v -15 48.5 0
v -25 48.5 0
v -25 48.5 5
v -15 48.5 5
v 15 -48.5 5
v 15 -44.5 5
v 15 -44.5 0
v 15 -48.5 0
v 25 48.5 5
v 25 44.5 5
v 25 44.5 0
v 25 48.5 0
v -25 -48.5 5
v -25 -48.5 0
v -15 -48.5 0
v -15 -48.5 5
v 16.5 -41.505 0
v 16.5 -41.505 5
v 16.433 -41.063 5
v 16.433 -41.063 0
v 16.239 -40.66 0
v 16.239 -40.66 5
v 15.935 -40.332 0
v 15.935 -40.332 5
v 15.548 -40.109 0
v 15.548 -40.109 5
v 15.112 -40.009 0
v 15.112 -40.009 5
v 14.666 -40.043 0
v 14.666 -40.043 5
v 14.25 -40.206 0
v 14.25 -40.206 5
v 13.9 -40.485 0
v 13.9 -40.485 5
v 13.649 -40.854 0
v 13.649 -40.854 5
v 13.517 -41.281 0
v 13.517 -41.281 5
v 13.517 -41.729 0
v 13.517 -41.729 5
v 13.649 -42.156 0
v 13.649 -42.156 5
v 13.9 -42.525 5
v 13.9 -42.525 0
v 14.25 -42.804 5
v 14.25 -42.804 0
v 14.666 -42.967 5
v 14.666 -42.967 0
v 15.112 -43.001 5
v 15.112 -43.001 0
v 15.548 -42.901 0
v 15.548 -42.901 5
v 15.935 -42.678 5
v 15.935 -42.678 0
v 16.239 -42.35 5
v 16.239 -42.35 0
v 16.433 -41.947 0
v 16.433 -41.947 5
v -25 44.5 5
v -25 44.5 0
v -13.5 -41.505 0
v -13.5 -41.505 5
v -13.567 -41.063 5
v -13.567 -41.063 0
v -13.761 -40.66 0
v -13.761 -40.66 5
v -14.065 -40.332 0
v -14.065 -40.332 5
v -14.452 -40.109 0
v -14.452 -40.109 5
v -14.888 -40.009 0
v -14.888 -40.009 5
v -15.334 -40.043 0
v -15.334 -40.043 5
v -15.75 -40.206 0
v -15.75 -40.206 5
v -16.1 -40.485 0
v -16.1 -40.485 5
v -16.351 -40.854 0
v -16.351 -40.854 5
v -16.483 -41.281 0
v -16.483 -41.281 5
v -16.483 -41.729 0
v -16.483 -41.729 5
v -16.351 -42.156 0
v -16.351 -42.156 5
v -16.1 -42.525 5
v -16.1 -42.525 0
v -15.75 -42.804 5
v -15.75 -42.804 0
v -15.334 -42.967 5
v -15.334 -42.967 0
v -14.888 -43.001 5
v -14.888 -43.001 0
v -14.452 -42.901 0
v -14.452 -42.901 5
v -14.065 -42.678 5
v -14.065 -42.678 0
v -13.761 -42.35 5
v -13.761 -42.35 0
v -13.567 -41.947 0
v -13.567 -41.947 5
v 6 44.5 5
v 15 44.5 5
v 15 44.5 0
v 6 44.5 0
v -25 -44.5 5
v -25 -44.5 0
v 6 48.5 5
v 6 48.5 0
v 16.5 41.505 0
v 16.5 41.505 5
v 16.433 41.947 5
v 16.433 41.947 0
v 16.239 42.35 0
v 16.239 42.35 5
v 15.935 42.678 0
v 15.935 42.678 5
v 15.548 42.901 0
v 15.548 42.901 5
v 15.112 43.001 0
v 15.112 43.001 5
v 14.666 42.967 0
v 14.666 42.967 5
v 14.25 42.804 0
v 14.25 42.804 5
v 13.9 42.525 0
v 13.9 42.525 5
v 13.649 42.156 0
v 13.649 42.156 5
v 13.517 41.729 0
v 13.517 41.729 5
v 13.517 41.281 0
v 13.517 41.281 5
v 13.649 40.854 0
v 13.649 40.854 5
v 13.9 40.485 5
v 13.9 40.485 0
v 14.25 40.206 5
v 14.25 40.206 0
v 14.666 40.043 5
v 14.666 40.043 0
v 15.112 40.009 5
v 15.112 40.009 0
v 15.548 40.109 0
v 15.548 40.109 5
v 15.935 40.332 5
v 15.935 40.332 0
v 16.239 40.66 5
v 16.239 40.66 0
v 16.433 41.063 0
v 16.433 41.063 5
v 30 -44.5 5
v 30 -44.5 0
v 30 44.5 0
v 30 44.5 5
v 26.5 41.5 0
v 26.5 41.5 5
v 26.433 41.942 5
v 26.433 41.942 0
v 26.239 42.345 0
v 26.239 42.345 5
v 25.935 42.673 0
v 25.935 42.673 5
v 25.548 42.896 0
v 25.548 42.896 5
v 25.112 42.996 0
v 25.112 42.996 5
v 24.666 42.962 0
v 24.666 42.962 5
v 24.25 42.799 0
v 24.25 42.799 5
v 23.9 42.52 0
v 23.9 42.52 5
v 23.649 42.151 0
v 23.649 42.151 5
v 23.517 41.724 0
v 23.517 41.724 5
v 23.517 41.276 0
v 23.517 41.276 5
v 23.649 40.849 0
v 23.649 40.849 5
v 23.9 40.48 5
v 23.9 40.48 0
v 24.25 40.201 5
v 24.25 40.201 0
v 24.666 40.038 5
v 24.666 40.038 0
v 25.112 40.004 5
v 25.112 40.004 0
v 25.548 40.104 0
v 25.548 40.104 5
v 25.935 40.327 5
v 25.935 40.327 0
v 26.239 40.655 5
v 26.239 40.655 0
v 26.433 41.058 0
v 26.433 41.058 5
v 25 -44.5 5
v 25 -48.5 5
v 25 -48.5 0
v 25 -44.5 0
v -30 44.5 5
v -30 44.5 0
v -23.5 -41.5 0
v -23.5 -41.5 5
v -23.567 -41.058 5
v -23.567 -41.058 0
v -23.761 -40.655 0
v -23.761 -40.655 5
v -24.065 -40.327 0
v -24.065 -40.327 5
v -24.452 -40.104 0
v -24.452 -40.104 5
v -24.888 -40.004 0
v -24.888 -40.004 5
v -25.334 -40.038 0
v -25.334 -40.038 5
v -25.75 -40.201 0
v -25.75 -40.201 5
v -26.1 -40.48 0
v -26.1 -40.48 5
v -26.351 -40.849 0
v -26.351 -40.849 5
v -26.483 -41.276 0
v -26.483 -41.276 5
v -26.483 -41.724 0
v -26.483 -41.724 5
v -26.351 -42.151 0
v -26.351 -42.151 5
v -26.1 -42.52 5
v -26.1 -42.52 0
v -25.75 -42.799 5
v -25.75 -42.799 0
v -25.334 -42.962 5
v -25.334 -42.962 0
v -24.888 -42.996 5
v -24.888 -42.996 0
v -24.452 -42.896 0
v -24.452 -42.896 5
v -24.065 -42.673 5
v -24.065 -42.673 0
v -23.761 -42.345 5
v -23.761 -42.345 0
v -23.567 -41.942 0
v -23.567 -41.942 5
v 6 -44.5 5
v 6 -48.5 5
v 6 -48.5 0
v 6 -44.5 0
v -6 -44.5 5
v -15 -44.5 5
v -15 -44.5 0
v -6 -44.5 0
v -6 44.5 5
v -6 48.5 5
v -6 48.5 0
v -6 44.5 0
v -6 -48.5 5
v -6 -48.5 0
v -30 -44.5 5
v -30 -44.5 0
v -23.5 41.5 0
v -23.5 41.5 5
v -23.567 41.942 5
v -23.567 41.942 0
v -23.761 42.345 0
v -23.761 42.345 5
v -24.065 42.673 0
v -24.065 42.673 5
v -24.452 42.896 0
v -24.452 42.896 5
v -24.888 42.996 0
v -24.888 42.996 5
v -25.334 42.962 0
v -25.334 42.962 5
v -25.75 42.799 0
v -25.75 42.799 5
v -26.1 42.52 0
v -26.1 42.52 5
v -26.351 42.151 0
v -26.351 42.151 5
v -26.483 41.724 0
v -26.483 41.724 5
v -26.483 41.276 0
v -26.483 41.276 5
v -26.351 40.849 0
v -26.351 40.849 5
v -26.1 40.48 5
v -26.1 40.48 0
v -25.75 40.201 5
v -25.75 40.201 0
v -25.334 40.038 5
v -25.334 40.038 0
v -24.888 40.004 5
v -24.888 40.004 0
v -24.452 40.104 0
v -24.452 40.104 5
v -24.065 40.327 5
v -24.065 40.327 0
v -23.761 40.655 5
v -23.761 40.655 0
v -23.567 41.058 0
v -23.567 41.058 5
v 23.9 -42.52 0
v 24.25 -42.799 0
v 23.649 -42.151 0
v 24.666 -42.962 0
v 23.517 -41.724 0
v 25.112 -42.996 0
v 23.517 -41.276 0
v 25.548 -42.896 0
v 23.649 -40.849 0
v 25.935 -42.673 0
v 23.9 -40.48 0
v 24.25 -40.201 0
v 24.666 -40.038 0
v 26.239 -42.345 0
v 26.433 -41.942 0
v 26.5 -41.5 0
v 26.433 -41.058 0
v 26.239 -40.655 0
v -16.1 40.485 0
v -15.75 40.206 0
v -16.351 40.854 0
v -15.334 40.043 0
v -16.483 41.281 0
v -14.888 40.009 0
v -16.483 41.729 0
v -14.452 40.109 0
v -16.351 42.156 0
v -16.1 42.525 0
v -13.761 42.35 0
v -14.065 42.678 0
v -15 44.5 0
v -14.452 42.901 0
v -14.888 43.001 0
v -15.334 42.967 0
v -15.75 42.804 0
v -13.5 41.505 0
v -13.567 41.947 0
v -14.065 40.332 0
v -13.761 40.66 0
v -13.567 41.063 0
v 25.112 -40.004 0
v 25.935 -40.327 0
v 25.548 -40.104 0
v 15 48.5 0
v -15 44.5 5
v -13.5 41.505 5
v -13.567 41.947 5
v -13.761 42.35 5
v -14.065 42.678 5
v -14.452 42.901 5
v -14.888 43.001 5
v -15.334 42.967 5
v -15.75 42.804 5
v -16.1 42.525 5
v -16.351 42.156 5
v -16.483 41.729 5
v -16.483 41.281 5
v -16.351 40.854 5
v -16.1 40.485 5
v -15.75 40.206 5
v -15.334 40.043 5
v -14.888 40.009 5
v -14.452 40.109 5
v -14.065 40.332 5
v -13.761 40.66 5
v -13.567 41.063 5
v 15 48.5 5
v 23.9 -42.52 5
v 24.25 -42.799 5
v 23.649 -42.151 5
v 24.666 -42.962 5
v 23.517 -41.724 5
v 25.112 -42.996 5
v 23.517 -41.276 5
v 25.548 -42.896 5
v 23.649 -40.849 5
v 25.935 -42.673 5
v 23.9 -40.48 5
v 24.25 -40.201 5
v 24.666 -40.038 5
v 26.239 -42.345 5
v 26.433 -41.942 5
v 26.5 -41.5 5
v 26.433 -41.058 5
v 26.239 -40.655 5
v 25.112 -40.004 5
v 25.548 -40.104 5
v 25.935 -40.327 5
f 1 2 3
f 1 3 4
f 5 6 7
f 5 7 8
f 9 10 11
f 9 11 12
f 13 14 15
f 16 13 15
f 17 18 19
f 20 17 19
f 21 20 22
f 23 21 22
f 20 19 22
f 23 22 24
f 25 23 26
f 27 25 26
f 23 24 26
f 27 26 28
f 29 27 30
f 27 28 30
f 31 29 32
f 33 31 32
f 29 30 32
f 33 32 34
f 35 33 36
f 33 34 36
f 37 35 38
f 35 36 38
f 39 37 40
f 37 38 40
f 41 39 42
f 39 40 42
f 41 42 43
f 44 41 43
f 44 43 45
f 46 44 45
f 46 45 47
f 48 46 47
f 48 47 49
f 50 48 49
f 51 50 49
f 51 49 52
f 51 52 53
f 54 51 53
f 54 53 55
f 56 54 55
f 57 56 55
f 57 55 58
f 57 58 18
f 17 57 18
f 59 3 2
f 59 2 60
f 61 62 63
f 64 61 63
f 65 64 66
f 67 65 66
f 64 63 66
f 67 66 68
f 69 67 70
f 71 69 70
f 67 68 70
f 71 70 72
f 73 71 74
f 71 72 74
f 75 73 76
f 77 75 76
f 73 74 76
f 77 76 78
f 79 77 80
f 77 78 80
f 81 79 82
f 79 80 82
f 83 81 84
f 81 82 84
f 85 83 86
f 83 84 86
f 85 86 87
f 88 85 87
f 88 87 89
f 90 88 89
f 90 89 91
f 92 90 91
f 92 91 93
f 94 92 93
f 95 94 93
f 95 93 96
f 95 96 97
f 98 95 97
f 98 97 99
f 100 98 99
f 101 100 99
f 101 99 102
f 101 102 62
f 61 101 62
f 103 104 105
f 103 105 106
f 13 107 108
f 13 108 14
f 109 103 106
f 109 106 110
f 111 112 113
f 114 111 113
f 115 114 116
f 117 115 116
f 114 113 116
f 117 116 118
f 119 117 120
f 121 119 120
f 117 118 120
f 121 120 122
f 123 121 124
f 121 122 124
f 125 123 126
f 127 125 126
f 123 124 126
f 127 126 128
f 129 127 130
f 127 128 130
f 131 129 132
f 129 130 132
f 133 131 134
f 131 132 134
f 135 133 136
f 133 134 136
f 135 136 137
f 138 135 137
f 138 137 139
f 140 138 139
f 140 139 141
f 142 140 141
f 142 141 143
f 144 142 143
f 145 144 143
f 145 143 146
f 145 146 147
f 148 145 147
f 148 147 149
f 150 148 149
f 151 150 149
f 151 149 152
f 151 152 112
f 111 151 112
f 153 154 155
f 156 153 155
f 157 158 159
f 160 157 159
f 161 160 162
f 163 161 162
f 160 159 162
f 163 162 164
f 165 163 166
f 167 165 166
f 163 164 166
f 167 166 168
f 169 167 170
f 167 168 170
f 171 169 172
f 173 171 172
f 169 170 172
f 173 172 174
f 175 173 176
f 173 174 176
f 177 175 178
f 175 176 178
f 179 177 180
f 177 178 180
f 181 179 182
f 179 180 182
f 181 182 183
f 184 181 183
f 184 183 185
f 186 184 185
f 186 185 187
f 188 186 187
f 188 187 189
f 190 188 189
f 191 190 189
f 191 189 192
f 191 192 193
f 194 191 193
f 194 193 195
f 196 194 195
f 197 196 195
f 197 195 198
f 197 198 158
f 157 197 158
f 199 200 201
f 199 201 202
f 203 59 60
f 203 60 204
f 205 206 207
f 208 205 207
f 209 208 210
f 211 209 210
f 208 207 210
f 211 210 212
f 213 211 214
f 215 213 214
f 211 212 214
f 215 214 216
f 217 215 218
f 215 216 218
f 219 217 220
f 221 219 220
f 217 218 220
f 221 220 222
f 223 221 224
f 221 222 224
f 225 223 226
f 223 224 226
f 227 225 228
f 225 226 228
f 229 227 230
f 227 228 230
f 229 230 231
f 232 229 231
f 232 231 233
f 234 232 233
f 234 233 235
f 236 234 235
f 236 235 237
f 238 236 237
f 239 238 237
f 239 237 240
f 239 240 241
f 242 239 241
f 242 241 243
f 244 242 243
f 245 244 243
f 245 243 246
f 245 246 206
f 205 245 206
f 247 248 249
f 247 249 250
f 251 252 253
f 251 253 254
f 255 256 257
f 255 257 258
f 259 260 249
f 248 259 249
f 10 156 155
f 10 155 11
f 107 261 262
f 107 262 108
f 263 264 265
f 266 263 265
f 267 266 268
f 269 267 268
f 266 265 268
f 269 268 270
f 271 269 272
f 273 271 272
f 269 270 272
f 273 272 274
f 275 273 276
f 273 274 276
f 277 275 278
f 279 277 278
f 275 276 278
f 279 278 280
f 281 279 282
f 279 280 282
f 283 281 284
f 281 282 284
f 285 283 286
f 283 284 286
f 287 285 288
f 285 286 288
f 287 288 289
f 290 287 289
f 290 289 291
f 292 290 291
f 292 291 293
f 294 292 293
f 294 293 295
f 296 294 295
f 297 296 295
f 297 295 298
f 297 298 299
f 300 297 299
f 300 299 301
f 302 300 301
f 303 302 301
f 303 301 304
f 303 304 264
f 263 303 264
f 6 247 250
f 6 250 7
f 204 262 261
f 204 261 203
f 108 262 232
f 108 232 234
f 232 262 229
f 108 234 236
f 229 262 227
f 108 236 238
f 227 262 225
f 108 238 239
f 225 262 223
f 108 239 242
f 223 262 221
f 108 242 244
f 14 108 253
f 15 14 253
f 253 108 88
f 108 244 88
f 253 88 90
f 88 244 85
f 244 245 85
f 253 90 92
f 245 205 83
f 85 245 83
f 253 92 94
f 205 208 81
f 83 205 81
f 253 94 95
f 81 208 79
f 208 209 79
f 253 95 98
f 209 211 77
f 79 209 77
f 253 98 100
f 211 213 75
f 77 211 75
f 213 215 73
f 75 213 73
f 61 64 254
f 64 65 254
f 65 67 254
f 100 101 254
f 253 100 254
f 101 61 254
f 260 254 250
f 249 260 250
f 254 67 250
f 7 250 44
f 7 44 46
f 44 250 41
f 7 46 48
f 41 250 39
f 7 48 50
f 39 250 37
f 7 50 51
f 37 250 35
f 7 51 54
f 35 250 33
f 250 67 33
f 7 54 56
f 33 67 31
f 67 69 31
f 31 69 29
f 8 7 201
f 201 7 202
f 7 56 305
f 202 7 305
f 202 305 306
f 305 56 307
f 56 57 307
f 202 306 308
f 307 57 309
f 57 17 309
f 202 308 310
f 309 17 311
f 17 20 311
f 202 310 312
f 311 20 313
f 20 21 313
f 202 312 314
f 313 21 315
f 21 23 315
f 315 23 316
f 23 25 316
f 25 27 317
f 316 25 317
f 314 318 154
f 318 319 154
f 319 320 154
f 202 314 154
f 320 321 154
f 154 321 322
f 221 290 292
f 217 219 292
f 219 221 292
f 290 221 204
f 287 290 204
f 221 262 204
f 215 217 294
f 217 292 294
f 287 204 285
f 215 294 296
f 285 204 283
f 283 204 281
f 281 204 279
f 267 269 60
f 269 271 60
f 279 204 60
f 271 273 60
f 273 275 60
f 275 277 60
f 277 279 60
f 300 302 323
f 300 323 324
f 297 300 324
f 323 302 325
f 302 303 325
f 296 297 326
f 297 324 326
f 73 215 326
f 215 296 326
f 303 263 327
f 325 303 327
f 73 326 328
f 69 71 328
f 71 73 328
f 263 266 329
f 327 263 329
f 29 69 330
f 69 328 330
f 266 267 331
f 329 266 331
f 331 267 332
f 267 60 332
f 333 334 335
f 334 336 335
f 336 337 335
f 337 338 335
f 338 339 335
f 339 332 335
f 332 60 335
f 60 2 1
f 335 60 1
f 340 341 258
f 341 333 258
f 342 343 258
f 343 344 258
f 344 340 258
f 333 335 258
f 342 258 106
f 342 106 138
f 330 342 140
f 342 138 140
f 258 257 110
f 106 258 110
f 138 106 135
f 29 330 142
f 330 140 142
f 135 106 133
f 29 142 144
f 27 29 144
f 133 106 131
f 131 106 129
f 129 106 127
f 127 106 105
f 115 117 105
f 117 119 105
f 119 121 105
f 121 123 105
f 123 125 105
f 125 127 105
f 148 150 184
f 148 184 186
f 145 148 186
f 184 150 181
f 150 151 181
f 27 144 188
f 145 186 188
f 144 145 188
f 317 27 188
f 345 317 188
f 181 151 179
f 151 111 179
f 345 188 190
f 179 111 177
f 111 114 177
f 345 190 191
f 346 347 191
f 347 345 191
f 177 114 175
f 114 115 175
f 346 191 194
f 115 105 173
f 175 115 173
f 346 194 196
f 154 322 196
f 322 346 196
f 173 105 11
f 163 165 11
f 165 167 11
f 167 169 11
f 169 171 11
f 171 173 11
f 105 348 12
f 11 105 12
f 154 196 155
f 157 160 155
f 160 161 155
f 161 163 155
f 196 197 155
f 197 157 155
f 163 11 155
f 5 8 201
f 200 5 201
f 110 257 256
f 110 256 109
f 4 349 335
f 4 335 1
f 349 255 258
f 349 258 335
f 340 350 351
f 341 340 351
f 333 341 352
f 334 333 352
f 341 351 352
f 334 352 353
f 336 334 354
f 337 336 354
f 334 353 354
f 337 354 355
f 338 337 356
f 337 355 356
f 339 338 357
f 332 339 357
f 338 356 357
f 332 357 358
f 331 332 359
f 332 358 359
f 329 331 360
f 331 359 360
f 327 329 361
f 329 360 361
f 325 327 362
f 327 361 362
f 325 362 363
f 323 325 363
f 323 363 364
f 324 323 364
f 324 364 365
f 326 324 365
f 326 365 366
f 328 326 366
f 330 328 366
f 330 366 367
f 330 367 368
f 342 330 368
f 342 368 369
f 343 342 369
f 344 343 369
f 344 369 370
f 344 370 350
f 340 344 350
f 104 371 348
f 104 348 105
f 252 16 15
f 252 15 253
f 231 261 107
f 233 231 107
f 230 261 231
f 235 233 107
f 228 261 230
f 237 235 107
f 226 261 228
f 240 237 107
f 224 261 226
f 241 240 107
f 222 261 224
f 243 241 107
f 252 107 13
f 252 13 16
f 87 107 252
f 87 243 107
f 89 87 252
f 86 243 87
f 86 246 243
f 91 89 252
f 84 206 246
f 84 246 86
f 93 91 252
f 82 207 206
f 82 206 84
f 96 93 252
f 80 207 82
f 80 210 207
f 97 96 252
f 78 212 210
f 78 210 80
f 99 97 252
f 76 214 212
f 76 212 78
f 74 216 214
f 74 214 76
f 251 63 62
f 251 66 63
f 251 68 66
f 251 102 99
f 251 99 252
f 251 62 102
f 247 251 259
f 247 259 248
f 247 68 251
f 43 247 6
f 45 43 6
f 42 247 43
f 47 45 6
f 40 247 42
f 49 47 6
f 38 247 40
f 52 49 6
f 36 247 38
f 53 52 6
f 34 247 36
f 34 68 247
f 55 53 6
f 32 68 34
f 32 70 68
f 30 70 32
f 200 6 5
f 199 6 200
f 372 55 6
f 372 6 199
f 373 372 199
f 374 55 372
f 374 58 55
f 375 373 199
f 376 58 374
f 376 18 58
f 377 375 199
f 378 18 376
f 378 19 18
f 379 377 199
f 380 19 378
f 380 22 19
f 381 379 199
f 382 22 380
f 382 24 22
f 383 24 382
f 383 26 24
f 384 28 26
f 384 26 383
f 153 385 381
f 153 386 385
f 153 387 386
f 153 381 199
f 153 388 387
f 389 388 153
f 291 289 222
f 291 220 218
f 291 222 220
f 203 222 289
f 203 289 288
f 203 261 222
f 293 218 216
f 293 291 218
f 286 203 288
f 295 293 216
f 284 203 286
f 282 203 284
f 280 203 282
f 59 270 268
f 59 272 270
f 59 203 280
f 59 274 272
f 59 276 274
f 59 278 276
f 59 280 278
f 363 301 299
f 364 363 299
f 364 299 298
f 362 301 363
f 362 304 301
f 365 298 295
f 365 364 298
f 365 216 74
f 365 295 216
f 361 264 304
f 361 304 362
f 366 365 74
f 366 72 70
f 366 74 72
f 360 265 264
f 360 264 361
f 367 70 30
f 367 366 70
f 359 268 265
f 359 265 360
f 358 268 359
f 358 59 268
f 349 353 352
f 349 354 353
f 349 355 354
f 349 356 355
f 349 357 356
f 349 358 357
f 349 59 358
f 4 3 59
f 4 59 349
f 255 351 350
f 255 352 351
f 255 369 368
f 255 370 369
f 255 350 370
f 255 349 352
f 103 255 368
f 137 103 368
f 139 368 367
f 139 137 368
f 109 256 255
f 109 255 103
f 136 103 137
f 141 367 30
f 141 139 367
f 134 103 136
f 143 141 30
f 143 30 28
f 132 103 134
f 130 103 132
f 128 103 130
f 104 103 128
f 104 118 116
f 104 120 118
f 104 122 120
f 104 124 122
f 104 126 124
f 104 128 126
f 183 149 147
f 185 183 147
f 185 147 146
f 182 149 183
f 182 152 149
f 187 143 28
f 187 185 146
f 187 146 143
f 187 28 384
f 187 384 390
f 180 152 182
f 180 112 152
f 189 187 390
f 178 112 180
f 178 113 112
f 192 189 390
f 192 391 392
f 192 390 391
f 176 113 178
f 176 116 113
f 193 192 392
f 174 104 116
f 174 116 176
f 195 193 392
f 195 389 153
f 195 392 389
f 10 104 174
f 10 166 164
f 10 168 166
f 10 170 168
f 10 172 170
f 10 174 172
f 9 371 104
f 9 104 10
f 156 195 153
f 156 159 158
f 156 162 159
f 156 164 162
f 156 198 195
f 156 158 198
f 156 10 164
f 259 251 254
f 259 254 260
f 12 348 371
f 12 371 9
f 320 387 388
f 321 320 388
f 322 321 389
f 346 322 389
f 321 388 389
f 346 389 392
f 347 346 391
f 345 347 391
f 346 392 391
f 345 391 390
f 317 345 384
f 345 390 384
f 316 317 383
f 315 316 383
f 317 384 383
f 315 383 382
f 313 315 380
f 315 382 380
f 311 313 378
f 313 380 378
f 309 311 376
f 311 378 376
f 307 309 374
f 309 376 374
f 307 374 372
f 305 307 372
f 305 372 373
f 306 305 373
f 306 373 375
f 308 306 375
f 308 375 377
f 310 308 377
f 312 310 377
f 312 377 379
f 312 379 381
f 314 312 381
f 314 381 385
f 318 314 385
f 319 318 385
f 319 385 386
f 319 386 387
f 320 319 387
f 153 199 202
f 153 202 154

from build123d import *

# Parameters (mm, degrees)
SKETCH_1_W          = 60
SKETCH_1_H          = 97
EXTRUDE_1_DEPTH     = 5
SKETCH_2_OUTSIDE_W  = 84.834
SKETCH_2_OUTSIDE_H  = 121.834
CUT_EXTRUDE_1_DEPTH = 10
SKETCH_3_R          = 1.5
CUT_EXTRUDE_2_DEPTH = 10


with BuildPart() as part:
    # 草图1 → 凸台-拉伸1 (new body)
    with BuildSketch(Plane.XY):
        Rectangle(SKETCH_1_W, SKETCH_1_H)
    extrude(amount=EXTRUDE_1_DEPTH)

    # 草图2 outside → 切除-拉伸1 (cut)
    with BuildSketch(Plane.XY.offset(5)):
        Rectangle(SKETCH_2_OUTSIDE_W, SKETCH_2_OUTSIDE_H)
        Polygon((6, 48.5), (-6, 48.5), (-6, 44.5), (-15, 44.5), (-15, 48.5), (-25, 48.5), (-25, 44.5), (-30, 44.5), (-30, -44.5), (-25, -44.5), (-25, -48.5), (-15, -48.5), (-15, -44.5), (-6, -44.5), (-6, -48.5), (6, -48.5), (6, -44.5), (15, -44.5), (15, -48.5), (25, -48.5), (25, -44.5), (30, -44.5), (30, 44.5), (25, 44.5), (25, 48.5), (15, 48.5), (15, 44.5), (6, 44.5), align=None, mode=Mode.SUBTRACT)
    extrude(amount=-CUT_EXTRUDE_1_DEPTH, mode=Mode.SUBTRACT)

    # 草图3 → 切除-拉伸2 (cut)
    with BuildSketch(Plane.XY.offset(5)):
        with Locations((-25, 41.5)):
            Circle(SKETCH_3_R)
        with Locations((-15.000001244, 41.504987561)):
            Circle(SKETCH_3_R)
        with Locations((15.000001244, 41.504987561)):
            Circle(SKETCH_3_R)
        with Locations((25, 41.5)):
            Circle(SKETCH_3_R)
        with Locations((25, -41.5)):
            Circle(SKETCH_3_R)
        with Locations((15.000001244, -41.504987561)):
            Circle(SKETCH_3_R)
        with Locations((-15.000001244, -41.504987561)):
            Circle(SKETCH_3_R)
        with Locations((-25, -41.5)):
            Circle(SKETCH_3_R)
    extrude(amount=-CUT_EXTRUDE_2_DEPTH, mode=Mode.SUBTRACT)


solid = part.part
